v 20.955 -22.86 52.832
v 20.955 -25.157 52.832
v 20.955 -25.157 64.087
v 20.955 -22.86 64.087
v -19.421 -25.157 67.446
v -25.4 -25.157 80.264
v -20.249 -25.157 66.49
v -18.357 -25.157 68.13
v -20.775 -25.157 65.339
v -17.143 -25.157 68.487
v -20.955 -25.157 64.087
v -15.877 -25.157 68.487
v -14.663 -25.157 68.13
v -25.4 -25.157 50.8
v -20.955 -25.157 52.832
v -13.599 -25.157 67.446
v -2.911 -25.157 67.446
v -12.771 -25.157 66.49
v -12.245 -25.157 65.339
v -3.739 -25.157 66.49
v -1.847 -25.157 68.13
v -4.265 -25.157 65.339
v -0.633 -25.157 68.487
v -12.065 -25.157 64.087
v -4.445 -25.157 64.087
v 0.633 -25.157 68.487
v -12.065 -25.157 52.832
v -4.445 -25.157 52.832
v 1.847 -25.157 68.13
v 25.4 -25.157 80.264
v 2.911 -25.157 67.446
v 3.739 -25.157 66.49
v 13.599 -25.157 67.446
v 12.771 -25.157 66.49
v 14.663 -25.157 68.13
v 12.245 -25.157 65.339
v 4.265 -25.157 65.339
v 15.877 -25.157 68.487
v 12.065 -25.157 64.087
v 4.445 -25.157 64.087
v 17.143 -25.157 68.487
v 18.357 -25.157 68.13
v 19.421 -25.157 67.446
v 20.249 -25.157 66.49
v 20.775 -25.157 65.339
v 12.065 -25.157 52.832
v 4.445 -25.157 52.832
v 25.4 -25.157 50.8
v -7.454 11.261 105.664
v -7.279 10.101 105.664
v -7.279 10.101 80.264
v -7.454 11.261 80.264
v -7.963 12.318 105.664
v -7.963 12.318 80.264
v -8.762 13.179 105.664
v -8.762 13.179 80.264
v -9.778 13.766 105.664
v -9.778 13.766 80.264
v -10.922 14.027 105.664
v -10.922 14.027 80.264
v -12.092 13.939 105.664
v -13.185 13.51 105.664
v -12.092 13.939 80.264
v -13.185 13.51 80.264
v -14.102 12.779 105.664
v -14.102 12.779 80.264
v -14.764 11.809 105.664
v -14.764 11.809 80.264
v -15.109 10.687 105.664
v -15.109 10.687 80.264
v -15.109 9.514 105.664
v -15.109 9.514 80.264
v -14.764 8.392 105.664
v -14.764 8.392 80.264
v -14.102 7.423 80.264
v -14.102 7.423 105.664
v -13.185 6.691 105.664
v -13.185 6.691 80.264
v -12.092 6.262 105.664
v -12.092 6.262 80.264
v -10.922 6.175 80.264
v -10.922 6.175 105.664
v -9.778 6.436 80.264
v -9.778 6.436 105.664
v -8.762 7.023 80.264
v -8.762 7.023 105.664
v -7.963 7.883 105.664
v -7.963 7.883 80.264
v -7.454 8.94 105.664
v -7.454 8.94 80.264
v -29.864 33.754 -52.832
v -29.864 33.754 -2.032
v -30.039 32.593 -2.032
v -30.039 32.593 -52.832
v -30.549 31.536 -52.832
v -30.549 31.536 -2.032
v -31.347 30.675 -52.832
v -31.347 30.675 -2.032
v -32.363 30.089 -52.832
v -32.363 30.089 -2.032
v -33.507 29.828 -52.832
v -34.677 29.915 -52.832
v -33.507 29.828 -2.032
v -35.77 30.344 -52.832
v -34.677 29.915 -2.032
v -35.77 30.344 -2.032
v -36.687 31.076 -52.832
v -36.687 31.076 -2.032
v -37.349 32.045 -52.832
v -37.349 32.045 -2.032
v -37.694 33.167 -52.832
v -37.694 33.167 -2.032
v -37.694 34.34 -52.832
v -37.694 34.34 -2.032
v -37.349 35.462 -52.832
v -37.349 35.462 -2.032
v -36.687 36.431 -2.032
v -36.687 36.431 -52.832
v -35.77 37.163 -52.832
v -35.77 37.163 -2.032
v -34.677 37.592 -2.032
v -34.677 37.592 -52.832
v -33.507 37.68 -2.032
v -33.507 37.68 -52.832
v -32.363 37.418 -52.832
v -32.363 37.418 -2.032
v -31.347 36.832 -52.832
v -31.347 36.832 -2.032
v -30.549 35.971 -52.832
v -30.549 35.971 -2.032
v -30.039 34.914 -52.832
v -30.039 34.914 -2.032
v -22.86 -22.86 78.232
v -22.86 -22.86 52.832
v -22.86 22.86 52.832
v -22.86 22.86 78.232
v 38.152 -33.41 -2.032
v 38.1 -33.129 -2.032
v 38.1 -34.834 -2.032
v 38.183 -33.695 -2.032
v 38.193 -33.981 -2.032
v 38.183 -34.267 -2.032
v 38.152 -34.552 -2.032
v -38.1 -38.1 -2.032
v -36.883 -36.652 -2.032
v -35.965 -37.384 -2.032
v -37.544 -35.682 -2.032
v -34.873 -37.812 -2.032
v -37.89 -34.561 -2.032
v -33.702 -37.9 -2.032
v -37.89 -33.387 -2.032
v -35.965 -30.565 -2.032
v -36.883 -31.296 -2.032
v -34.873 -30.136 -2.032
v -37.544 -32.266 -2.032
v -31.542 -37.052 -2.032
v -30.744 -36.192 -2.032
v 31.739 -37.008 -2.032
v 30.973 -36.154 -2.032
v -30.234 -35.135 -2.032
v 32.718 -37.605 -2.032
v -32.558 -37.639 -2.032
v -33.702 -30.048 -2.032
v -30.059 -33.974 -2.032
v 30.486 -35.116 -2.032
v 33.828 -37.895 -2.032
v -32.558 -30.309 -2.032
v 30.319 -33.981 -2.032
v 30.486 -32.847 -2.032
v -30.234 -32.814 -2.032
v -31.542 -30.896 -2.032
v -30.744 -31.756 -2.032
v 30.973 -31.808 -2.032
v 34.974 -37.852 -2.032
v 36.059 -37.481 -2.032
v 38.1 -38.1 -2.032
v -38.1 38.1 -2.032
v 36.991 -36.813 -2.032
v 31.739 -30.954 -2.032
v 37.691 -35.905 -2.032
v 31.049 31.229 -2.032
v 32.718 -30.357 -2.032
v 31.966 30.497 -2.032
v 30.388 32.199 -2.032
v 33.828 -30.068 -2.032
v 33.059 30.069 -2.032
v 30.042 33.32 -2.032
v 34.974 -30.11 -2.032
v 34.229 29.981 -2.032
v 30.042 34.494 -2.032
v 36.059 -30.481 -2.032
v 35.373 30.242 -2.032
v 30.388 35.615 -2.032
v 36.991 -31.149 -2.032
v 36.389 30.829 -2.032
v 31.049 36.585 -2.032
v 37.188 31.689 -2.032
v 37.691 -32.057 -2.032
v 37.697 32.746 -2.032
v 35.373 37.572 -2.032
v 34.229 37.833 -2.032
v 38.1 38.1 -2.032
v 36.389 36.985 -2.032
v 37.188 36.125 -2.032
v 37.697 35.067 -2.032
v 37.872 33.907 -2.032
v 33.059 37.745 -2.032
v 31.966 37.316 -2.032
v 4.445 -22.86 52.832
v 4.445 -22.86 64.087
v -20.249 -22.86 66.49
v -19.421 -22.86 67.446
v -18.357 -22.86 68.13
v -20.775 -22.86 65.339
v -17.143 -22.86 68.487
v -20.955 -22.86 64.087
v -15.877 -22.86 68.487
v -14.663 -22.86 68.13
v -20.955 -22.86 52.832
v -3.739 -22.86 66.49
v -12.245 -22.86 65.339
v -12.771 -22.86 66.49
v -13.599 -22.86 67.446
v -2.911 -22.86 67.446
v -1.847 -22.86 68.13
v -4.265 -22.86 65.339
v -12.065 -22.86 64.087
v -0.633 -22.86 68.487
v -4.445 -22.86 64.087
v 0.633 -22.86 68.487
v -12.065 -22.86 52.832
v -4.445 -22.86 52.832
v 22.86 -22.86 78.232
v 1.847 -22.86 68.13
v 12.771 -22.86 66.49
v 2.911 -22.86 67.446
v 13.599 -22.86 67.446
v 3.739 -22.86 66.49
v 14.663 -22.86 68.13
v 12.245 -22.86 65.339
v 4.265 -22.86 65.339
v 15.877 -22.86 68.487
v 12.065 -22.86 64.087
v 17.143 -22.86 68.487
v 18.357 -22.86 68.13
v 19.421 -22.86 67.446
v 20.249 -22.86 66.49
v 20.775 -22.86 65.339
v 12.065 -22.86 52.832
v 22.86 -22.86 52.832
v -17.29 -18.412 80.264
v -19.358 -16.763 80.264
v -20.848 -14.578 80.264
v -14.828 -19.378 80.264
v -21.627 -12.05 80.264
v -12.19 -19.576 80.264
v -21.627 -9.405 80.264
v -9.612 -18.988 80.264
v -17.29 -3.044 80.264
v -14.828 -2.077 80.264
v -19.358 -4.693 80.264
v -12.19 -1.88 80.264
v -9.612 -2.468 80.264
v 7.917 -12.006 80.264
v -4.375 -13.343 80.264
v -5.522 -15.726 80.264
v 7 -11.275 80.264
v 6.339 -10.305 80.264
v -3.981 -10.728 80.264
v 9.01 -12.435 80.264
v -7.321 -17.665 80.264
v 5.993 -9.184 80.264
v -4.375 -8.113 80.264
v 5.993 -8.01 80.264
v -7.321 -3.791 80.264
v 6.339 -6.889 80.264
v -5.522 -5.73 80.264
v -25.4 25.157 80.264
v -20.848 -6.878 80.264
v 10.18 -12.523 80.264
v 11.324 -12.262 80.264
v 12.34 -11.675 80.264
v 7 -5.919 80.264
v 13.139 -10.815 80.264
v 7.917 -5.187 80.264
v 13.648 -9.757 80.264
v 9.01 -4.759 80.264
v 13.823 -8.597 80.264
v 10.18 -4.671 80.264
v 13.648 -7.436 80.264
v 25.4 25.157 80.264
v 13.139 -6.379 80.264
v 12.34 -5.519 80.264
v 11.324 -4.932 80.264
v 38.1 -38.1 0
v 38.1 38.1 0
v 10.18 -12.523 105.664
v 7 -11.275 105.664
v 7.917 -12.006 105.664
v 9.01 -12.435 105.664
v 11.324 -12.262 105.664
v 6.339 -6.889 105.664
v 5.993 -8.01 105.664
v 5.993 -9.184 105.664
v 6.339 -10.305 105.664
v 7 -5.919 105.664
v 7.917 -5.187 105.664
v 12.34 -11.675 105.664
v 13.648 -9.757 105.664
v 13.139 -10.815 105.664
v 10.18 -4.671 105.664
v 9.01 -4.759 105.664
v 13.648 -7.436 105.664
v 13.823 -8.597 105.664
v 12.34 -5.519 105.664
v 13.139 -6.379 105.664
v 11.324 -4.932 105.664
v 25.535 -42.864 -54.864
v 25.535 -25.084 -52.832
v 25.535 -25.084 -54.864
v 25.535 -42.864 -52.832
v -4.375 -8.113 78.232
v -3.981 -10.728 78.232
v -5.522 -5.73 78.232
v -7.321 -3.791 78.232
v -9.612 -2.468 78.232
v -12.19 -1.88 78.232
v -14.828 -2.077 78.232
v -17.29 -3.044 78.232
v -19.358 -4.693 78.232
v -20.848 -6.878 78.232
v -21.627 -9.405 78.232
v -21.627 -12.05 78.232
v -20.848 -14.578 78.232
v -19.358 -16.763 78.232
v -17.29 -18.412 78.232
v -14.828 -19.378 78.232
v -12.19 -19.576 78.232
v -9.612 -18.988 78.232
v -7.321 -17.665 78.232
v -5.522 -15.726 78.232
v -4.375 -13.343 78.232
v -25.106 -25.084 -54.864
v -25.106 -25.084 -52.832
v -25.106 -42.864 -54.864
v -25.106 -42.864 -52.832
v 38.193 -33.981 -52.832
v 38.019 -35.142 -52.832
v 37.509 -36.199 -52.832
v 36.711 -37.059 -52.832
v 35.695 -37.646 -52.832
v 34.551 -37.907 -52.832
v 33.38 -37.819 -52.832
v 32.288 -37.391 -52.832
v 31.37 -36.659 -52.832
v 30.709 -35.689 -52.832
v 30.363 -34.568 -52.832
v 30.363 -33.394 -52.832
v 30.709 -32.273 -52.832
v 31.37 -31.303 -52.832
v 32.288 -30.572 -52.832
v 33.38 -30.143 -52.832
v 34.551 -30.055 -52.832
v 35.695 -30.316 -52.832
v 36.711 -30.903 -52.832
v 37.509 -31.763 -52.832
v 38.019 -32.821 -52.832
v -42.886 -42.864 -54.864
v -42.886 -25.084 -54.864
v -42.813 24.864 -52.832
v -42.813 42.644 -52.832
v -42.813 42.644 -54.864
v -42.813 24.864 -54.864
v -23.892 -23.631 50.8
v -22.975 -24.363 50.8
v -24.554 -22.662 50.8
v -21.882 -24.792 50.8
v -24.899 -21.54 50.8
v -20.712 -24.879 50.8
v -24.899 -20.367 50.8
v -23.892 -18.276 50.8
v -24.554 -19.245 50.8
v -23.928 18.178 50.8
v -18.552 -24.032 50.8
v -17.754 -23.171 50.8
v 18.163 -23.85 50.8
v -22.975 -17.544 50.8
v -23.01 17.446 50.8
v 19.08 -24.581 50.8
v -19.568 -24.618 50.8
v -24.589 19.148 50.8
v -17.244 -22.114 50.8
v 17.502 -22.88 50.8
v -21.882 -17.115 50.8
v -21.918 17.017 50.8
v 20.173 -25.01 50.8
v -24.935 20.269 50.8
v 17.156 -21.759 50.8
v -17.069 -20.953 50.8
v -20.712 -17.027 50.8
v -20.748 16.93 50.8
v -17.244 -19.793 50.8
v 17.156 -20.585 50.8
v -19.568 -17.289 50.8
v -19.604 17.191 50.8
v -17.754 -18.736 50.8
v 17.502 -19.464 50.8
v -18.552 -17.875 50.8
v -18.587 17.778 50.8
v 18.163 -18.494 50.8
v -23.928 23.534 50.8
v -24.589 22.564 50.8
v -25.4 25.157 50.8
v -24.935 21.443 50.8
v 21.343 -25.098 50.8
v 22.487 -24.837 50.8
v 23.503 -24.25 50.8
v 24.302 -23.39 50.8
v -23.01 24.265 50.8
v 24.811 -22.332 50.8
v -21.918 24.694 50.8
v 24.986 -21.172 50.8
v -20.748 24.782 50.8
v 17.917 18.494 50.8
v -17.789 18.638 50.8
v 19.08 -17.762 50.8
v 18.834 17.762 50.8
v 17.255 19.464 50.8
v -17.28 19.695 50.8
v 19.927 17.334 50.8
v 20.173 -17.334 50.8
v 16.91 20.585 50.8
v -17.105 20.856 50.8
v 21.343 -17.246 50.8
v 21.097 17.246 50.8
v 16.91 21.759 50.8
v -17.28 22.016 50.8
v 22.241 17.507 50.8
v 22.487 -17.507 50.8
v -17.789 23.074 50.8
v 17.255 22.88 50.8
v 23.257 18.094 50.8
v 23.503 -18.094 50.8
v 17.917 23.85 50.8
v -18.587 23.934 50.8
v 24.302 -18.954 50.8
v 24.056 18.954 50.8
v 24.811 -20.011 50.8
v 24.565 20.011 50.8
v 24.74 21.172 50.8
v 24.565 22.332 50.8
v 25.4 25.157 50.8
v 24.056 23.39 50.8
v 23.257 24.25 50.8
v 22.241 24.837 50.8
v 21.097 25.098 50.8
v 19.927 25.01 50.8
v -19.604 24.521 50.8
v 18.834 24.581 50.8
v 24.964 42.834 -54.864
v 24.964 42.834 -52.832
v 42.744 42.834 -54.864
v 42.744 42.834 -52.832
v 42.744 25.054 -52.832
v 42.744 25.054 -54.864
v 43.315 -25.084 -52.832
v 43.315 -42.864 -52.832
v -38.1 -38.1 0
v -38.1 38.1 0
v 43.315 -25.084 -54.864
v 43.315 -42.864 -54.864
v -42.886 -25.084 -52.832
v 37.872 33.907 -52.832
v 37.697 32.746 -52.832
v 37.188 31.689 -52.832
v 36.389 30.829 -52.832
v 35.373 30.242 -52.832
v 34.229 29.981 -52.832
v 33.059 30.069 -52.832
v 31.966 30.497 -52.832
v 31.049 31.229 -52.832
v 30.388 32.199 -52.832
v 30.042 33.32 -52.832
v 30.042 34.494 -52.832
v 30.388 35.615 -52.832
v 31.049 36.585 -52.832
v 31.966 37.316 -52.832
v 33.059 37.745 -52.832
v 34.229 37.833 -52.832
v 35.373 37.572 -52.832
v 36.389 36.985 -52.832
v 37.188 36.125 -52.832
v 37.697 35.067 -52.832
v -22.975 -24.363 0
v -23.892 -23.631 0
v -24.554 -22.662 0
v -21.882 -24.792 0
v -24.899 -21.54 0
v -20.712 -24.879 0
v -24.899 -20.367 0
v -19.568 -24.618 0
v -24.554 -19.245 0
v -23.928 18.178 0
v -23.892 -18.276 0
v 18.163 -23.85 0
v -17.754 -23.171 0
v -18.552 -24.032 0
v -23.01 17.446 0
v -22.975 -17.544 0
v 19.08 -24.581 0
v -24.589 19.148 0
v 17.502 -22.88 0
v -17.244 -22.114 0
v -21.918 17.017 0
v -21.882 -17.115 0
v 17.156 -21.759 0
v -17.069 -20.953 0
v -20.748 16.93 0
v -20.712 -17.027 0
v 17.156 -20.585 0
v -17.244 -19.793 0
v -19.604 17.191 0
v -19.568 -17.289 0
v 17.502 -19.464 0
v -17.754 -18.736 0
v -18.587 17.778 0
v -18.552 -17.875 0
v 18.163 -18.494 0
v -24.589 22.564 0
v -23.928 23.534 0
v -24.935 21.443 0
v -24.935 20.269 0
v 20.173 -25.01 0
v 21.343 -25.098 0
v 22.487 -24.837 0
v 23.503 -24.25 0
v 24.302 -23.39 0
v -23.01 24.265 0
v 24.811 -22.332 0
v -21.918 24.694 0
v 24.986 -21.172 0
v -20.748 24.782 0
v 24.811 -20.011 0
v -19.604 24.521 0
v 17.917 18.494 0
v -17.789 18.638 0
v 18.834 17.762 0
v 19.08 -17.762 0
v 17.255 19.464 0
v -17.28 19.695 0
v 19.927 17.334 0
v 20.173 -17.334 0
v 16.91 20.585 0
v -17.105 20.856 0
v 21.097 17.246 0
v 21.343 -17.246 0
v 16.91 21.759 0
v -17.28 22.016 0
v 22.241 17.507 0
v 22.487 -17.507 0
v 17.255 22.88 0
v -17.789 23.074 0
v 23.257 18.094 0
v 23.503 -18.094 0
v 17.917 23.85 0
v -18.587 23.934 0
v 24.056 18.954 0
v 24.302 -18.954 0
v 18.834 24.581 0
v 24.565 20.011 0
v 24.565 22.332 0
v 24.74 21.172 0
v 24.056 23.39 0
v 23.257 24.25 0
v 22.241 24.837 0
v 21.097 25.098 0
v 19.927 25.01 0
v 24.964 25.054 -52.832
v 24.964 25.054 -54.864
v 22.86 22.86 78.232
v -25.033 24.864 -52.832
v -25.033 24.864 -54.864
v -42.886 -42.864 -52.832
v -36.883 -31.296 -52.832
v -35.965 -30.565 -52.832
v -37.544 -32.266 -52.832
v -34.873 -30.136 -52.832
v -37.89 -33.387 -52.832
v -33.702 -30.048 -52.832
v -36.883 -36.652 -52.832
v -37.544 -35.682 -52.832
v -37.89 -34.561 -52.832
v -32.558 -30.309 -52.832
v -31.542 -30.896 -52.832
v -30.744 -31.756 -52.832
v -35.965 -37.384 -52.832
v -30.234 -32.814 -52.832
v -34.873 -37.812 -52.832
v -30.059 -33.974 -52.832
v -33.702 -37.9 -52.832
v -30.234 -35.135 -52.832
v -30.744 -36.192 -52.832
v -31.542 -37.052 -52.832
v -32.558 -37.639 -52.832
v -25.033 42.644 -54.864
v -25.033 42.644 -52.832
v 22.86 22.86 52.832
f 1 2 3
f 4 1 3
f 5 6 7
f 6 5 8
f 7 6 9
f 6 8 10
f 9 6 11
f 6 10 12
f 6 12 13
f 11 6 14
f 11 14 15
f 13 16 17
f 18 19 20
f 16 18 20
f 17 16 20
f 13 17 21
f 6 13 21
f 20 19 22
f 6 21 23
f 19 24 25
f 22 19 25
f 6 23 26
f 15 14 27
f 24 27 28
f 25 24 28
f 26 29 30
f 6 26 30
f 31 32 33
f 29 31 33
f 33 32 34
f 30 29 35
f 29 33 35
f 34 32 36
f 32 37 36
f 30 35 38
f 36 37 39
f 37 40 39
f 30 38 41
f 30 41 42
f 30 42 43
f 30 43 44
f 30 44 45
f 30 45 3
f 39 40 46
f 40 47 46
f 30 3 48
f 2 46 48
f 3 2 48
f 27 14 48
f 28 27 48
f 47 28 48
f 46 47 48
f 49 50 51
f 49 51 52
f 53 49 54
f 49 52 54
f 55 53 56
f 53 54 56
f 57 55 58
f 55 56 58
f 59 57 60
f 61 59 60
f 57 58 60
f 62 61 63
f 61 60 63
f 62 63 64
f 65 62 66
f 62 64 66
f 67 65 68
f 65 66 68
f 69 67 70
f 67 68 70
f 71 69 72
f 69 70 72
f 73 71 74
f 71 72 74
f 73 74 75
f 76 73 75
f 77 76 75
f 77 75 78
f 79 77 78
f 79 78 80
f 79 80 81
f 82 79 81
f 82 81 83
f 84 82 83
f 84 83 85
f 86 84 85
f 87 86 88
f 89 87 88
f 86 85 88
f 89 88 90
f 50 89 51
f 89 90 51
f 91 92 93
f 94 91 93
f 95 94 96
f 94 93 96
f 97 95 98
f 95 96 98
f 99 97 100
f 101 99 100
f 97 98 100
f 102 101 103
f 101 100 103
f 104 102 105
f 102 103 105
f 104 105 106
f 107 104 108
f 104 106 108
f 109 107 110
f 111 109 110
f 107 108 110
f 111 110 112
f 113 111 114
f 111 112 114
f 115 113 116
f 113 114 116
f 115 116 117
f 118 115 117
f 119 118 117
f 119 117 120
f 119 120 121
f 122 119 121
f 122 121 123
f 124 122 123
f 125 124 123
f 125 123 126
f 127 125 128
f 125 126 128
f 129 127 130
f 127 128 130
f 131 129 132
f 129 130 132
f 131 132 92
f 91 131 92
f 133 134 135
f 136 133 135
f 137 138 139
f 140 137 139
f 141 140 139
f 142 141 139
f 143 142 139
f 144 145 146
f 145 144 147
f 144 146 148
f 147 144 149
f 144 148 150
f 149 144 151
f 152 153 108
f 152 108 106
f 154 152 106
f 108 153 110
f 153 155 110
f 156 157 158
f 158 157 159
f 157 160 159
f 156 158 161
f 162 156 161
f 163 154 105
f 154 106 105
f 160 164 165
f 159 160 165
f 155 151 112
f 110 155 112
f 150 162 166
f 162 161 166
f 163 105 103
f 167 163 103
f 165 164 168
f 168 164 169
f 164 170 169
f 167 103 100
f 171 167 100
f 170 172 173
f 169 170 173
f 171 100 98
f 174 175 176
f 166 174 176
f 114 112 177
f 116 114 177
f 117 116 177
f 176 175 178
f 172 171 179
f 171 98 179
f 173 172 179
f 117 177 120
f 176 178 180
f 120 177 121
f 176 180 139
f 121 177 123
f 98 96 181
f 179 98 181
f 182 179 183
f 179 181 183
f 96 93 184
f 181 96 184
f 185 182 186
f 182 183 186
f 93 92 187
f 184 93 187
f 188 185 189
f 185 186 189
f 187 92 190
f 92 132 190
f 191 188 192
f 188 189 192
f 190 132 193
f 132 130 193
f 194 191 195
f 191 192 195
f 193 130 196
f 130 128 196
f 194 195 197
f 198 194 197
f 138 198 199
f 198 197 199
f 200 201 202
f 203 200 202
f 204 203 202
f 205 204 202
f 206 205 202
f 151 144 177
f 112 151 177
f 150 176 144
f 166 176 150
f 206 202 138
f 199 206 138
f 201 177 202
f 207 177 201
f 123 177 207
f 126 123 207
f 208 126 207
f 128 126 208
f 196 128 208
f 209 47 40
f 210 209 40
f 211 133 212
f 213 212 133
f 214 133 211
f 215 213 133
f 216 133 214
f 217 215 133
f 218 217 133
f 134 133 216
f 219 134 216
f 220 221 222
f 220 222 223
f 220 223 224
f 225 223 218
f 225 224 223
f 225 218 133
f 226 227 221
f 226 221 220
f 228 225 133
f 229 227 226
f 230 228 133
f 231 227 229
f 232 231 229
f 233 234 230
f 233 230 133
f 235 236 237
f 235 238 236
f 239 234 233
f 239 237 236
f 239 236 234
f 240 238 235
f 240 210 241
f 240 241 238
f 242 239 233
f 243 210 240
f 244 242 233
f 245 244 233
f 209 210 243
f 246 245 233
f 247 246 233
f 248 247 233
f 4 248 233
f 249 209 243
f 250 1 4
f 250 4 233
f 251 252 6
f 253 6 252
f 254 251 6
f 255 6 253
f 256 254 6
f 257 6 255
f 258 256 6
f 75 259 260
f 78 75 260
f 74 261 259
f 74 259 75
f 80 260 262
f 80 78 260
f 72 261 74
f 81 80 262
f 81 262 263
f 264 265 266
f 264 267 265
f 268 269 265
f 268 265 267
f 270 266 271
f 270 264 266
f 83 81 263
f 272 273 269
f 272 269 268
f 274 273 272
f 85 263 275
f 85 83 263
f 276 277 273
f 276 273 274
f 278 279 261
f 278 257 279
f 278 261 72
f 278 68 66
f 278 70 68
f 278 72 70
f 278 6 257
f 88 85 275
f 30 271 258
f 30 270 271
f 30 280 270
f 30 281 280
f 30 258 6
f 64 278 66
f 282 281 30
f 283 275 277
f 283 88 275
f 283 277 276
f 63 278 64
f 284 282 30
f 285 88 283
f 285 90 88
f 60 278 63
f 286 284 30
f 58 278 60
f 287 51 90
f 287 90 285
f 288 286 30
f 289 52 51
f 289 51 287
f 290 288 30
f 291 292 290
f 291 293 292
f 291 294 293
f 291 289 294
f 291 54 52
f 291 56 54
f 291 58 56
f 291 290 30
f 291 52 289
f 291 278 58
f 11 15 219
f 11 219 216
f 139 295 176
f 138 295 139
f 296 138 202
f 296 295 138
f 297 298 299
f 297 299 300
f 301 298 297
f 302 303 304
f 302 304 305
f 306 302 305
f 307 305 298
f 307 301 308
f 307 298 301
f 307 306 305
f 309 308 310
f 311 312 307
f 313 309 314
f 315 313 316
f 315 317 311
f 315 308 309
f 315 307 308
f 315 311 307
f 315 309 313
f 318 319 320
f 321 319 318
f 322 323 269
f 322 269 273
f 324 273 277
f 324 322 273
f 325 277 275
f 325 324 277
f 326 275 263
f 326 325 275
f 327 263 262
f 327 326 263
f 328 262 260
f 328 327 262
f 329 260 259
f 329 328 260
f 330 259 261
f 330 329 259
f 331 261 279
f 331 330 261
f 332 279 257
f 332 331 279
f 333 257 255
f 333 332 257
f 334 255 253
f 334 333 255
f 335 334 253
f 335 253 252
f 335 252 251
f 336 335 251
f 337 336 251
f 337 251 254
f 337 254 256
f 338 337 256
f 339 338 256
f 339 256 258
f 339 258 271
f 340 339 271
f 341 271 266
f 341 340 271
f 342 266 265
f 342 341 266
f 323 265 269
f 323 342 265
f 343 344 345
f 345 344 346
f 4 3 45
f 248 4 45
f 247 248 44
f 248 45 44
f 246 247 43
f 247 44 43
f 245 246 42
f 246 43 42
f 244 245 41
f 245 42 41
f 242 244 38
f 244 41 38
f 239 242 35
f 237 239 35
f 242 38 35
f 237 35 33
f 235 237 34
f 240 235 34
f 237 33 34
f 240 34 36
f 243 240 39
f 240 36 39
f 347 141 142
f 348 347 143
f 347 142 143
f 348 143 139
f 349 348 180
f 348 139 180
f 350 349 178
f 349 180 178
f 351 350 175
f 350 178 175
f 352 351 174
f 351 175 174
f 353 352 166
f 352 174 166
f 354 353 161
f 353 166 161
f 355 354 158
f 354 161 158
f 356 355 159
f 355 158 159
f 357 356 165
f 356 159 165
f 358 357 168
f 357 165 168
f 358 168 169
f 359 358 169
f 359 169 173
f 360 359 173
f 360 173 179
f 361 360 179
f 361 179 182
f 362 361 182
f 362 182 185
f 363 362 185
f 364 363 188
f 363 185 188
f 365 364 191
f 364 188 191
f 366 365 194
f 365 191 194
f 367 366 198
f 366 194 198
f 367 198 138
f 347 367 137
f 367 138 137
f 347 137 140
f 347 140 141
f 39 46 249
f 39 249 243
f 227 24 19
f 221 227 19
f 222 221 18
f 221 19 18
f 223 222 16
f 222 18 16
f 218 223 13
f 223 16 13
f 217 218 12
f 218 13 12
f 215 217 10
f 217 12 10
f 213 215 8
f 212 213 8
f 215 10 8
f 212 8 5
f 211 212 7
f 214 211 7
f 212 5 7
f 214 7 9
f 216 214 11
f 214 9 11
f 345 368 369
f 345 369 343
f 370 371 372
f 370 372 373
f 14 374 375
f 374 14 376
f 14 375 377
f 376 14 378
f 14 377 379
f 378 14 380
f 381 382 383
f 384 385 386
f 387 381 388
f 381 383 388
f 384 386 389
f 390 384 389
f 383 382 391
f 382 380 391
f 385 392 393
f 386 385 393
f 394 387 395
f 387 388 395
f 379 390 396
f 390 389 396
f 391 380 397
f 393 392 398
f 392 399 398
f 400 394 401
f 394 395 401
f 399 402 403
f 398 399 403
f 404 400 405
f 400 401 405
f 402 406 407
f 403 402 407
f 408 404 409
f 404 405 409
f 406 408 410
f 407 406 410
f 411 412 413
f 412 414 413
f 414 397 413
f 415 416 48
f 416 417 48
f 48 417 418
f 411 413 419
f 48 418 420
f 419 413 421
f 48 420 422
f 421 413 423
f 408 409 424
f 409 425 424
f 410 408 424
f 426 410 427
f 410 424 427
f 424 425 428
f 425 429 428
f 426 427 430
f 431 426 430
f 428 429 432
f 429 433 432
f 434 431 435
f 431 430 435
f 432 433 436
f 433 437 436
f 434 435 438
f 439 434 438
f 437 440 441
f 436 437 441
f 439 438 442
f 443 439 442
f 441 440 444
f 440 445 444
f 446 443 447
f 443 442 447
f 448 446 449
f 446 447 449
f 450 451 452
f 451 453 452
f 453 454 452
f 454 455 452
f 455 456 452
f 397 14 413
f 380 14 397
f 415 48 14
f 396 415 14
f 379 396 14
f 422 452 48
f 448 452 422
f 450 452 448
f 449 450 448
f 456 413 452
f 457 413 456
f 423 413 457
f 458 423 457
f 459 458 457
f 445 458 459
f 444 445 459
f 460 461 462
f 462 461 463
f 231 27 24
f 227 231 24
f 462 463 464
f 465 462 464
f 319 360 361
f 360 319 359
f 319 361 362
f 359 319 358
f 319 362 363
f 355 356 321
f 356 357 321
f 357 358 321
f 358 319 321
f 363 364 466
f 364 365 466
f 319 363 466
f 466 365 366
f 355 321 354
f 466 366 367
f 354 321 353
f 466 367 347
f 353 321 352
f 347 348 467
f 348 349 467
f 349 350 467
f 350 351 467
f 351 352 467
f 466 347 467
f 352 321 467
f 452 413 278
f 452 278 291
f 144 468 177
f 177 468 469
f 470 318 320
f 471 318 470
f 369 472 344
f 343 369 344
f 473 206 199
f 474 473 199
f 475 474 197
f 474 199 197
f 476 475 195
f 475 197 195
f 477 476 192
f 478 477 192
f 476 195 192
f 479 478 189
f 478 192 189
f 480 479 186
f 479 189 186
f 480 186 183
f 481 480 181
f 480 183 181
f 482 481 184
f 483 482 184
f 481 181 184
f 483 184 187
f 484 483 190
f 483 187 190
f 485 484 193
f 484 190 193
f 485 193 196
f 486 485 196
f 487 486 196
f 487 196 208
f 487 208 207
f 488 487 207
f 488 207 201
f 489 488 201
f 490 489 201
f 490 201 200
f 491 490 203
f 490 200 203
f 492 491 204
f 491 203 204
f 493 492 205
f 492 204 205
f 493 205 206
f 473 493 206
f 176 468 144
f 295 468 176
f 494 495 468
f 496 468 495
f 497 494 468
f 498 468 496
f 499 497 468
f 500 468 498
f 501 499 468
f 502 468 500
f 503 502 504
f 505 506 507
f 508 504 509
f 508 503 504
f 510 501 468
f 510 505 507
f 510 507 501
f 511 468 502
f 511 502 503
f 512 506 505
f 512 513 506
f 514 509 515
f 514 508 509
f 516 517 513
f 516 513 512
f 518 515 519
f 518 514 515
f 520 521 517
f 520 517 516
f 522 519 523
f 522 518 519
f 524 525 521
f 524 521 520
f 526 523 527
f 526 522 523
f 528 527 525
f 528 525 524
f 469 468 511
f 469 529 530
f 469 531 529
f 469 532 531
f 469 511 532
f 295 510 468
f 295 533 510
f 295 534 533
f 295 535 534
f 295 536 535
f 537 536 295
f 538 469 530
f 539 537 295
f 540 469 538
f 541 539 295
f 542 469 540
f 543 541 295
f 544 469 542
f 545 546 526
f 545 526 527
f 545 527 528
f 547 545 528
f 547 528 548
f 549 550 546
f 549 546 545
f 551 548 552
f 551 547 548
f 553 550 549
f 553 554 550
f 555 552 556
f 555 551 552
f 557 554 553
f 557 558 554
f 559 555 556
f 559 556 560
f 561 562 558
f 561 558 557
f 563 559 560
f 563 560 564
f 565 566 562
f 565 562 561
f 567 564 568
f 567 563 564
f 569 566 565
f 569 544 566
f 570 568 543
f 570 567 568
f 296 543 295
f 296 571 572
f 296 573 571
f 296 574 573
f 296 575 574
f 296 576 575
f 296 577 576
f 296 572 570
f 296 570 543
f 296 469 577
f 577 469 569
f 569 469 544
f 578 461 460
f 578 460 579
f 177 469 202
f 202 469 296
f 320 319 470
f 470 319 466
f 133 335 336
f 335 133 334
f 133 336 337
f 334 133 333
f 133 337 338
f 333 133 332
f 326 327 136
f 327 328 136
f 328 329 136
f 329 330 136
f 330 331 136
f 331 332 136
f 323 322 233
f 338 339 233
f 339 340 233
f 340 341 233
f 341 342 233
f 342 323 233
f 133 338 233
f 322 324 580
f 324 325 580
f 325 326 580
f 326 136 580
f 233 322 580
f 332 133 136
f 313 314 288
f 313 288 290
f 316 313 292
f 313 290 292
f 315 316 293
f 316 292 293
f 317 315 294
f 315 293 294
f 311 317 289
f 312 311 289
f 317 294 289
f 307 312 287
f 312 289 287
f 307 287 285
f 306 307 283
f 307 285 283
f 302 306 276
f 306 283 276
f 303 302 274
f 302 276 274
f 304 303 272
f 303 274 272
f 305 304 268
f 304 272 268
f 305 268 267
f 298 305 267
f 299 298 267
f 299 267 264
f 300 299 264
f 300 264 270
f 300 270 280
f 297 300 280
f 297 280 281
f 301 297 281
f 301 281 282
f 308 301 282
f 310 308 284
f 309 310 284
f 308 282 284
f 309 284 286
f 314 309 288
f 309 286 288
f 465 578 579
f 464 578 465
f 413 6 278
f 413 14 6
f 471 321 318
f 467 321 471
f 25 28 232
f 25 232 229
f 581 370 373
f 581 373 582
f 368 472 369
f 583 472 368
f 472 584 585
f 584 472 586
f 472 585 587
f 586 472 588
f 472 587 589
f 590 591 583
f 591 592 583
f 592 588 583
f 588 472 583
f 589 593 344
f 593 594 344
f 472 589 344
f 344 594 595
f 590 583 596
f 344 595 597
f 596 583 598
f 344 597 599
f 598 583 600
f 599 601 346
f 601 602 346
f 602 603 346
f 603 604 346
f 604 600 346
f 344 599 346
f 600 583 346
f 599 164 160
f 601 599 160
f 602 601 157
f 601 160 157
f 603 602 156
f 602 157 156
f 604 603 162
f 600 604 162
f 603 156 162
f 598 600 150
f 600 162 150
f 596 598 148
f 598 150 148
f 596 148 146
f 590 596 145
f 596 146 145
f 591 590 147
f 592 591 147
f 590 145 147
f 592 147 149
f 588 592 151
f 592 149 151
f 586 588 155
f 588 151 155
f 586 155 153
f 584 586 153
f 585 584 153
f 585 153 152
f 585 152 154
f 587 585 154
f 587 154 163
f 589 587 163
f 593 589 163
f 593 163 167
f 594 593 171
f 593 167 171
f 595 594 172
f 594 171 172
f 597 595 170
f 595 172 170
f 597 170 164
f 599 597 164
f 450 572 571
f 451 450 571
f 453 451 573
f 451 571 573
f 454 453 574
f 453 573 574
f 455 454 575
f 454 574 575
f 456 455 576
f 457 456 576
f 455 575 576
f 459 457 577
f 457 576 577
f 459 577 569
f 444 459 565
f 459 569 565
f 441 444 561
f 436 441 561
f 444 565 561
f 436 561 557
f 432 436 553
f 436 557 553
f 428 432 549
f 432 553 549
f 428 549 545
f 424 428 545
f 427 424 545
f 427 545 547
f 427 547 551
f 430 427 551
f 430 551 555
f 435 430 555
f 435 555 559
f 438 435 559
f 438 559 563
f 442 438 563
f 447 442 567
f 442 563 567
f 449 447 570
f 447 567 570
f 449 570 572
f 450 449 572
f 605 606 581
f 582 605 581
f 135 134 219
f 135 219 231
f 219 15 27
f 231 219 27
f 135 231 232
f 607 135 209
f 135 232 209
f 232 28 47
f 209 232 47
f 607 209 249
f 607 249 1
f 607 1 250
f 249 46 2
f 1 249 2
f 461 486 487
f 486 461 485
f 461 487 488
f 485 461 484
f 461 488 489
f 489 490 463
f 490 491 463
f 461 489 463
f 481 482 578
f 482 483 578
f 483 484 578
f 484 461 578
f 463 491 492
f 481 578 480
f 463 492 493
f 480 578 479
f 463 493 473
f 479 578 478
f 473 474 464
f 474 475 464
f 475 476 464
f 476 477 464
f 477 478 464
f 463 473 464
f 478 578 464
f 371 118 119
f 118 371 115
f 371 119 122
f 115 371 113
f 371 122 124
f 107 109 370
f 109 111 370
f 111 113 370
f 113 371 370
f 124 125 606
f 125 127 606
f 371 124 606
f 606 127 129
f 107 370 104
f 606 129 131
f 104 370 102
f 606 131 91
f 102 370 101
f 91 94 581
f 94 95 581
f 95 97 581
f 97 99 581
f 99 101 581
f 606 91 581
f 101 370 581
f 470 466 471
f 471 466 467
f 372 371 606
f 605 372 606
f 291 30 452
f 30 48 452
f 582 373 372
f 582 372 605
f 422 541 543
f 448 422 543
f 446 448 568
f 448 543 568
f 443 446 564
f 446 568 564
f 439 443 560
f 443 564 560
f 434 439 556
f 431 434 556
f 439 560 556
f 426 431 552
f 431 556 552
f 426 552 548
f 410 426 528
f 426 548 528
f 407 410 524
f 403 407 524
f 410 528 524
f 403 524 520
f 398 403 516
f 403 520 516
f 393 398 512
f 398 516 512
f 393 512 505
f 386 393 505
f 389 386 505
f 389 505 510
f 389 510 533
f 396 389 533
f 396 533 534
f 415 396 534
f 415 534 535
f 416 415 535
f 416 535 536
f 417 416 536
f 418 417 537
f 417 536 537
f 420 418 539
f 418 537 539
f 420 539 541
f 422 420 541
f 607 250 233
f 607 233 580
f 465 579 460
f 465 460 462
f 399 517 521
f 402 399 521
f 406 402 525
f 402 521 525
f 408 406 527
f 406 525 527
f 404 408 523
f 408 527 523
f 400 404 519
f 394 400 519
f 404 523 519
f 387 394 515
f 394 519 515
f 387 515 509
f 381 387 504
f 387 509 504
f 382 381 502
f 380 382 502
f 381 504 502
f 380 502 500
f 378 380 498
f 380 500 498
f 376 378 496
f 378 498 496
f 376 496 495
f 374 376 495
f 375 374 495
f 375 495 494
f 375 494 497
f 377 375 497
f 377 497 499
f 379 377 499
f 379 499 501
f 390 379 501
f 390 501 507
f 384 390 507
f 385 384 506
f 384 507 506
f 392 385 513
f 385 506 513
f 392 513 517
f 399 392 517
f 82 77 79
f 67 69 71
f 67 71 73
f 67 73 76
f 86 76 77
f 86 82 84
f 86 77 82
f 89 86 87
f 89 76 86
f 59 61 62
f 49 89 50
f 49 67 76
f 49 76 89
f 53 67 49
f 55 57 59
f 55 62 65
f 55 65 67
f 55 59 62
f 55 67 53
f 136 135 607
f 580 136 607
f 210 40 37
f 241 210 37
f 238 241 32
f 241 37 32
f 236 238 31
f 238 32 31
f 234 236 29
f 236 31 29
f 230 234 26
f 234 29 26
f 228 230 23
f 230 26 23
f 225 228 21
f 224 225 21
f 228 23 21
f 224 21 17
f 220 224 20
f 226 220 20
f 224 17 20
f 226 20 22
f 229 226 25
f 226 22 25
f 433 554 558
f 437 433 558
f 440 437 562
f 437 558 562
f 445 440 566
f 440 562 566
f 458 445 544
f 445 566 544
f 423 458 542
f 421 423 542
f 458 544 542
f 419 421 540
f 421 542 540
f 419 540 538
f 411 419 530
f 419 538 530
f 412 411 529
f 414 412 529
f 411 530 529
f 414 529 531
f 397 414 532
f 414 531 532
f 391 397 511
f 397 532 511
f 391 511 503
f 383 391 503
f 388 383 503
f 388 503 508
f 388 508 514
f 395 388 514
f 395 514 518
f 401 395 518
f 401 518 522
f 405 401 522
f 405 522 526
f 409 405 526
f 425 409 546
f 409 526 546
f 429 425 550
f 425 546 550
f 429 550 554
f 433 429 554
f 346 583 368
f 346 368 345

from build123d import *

# Parameters (mm, degrees)
F0_W      = 76.2
F0_H      = 76.2
F1_DEPTH  = 2.032
F2_R      = 3.937
F3_DEPTH  = 50.8
F4_W      = 50.8
F4_H      = 50.31309912
F5_DEPTH  = 2.032
F6_W      = 50.8
F6_H      = 50.31309912
F6_W_2    = 45.72
F6_H_2    = 45.72
F7_DEPTH  = 25.4
F8_W      = 50.8
F8_H      = 50.31309912
F8_W_2    = 45.72
F8_H_2    = 45.72
F8_R      = 8.8730231001
F9_DEPTH  = 2.032
F10_W     = 8.89
F10_H     = 11.2548470073
F11_DEPTH = 7.62
F12_R     = 3.937
F13_DEPTH = 50.8
F14_W     = 17.78
F14_H     = 17.78
F15_DEPTH = 2.032
F16_R     = 3.937
F17_DEPTH = 25.4


with BuildPart() as f1:
    # F0 (on Top) → F1 (new body)
    with BuildSketch(Plane.XY):
        Rectangle(F0_W, F0_H)
    extrude(amount=-F1_DEPTH)

    # F2 (on face) → F3 (join)
    with BuildSketch(Plane.XY):
        with Locations((-21.0064100094, -20.9534343708)):
            Circle(F2_R)
        with Locations((-21.0418901269, 20.855767953)):
            Circle(F2_R)
        with Locations((21.0487861186, -21.1718771607)):
            Circle(F2_R)
        with Locations((20.8026003093, 21.1718771607)):
            Circle(F2_R)
    extrude(amount=F3_DEPTH)

    # F4 (on face) → F5 (join)
    with BuildSketch(Plane.XY.offset(50.8)):
        Rectangle(F4_W, F4_H)
    extrude(amount=F5_DEPTH)

    # F6 (on face) → F7 (join)
    with BuildSketch(Plane.XY.offset(52.832)):
        Rectangle(F6_W, F6_H)
        Rectangle(F6_W_2, F6_H_2, mode=Mode.SUBTRACT)
    extrude(amount=F7_DEPTH)

    # F8 (on face) → F9 (join)
    with BuildSketch(Plane.XY.offset(78.232)):
        Rectangle(F8_W, F8_H)
        Rectangle(F8_W_2, F8_H_2, mode=Mode.SUBTRACT)
        Rectangle(F8_W_2, F8_H_2)
        with Locations((-12.8535525873, -10.7279159129)):
            Circle(F8_R, mode=Mode.SUBTRACT)
    extrude(amount=F9_DEPTH)

    # F10 (on face) → F11 (cut)
    with BuildSketch(Plane.XZ.offset(25.15654956)):
        with Locations((16.51, 58.4594235036)):
            Rectangle(F10_W, F10_H)
        with BuildLine():
            ThreePointArc((20.955, 64.0868470073), (16.51, 68.5318470073), (12.065, 64.0868470073))
            Line((12.065, 64.0868470073), (20.955, 64.0868470073))
        make_face()
        with Locations((0, 58.4594235036)):
            Rectangle(F10_W, F10_H)
        with BuildLine():
            ThreePointArc((4.445, 64.0868470073), (0, 68.5318470073), (-4.445, 64.0868470073))
            Line((-4.445, 64.0868470073), (4.445, 64.0868470073))
        make_face()
        with Locations((-16.51, 58.4594235036)):
            Rectangle(F10_W, F10_H)
        with BuildLine():
            ThreePointArc((-12.065, 64.0868470073), (-16.51, 68.5318470073), (-20.955, 64.0868470073))
            Line((-20.955, 64.0868470073), (-12.065, 64.0868470073))
        make_face()
    extrude(amount=-F11_DEPTH, mode=Mode.SUBTRACT)

    # F12 (on face) → F13 (join)
    with BuildSketch(Plane(origin=(0, 0, -2.032), x_dir=(1, 0, 0), z_dir=(0, 0, -1))):
        with Locations((-33.9964929416, 33.9741817005)):
            Circle(F12_R)
        with Locations((34.2564113713, 33.9811018472)):
            Circle(F12_R)
        with Locations((-33.8014231791, -33.7535219774)):
            Circle(F12_R)
        with Locations((33.9347845396, -33.9068524793)):
            Circle(F12_R)
    extrude(amount=F13_DEPTH)

    # F14 (on face) → F15 (join)
    with BuildSketch(Plane(origin=(0, 0, -52.832), x_dir=(1, 0, 0), z_dir=(0, 0, -1))):
        with Locations((-33.9964929416, 33.9741817005)):
            Rectangle(F14_W, F14_H)
        with Locations((34.4249159098, 33.9741817005)):
            Rectangle(F14_W, F14_H)
        with Locations((-33.9227057993, -33.7536521256)):
            Rectangle(F14_W, F14_H)
        with Locations((33.8537693024, -33.9440368116)):
            Rectangle(F14_W, F14_H)
    extrude(amount=F15_DEPTH)

    # F16 (on face) → F17 (join)
    with BuildSketch(Plane.XY.offset(80.264)):
        with Locations((-11.2163906208, 10.1006944331)):
            Circle(F16_R)
        with Locations((9.8858151284, -8.5968601803)):
            Circle(F16_R)
    extrude(amount=F17_DEPTH)


solid = f1.part
